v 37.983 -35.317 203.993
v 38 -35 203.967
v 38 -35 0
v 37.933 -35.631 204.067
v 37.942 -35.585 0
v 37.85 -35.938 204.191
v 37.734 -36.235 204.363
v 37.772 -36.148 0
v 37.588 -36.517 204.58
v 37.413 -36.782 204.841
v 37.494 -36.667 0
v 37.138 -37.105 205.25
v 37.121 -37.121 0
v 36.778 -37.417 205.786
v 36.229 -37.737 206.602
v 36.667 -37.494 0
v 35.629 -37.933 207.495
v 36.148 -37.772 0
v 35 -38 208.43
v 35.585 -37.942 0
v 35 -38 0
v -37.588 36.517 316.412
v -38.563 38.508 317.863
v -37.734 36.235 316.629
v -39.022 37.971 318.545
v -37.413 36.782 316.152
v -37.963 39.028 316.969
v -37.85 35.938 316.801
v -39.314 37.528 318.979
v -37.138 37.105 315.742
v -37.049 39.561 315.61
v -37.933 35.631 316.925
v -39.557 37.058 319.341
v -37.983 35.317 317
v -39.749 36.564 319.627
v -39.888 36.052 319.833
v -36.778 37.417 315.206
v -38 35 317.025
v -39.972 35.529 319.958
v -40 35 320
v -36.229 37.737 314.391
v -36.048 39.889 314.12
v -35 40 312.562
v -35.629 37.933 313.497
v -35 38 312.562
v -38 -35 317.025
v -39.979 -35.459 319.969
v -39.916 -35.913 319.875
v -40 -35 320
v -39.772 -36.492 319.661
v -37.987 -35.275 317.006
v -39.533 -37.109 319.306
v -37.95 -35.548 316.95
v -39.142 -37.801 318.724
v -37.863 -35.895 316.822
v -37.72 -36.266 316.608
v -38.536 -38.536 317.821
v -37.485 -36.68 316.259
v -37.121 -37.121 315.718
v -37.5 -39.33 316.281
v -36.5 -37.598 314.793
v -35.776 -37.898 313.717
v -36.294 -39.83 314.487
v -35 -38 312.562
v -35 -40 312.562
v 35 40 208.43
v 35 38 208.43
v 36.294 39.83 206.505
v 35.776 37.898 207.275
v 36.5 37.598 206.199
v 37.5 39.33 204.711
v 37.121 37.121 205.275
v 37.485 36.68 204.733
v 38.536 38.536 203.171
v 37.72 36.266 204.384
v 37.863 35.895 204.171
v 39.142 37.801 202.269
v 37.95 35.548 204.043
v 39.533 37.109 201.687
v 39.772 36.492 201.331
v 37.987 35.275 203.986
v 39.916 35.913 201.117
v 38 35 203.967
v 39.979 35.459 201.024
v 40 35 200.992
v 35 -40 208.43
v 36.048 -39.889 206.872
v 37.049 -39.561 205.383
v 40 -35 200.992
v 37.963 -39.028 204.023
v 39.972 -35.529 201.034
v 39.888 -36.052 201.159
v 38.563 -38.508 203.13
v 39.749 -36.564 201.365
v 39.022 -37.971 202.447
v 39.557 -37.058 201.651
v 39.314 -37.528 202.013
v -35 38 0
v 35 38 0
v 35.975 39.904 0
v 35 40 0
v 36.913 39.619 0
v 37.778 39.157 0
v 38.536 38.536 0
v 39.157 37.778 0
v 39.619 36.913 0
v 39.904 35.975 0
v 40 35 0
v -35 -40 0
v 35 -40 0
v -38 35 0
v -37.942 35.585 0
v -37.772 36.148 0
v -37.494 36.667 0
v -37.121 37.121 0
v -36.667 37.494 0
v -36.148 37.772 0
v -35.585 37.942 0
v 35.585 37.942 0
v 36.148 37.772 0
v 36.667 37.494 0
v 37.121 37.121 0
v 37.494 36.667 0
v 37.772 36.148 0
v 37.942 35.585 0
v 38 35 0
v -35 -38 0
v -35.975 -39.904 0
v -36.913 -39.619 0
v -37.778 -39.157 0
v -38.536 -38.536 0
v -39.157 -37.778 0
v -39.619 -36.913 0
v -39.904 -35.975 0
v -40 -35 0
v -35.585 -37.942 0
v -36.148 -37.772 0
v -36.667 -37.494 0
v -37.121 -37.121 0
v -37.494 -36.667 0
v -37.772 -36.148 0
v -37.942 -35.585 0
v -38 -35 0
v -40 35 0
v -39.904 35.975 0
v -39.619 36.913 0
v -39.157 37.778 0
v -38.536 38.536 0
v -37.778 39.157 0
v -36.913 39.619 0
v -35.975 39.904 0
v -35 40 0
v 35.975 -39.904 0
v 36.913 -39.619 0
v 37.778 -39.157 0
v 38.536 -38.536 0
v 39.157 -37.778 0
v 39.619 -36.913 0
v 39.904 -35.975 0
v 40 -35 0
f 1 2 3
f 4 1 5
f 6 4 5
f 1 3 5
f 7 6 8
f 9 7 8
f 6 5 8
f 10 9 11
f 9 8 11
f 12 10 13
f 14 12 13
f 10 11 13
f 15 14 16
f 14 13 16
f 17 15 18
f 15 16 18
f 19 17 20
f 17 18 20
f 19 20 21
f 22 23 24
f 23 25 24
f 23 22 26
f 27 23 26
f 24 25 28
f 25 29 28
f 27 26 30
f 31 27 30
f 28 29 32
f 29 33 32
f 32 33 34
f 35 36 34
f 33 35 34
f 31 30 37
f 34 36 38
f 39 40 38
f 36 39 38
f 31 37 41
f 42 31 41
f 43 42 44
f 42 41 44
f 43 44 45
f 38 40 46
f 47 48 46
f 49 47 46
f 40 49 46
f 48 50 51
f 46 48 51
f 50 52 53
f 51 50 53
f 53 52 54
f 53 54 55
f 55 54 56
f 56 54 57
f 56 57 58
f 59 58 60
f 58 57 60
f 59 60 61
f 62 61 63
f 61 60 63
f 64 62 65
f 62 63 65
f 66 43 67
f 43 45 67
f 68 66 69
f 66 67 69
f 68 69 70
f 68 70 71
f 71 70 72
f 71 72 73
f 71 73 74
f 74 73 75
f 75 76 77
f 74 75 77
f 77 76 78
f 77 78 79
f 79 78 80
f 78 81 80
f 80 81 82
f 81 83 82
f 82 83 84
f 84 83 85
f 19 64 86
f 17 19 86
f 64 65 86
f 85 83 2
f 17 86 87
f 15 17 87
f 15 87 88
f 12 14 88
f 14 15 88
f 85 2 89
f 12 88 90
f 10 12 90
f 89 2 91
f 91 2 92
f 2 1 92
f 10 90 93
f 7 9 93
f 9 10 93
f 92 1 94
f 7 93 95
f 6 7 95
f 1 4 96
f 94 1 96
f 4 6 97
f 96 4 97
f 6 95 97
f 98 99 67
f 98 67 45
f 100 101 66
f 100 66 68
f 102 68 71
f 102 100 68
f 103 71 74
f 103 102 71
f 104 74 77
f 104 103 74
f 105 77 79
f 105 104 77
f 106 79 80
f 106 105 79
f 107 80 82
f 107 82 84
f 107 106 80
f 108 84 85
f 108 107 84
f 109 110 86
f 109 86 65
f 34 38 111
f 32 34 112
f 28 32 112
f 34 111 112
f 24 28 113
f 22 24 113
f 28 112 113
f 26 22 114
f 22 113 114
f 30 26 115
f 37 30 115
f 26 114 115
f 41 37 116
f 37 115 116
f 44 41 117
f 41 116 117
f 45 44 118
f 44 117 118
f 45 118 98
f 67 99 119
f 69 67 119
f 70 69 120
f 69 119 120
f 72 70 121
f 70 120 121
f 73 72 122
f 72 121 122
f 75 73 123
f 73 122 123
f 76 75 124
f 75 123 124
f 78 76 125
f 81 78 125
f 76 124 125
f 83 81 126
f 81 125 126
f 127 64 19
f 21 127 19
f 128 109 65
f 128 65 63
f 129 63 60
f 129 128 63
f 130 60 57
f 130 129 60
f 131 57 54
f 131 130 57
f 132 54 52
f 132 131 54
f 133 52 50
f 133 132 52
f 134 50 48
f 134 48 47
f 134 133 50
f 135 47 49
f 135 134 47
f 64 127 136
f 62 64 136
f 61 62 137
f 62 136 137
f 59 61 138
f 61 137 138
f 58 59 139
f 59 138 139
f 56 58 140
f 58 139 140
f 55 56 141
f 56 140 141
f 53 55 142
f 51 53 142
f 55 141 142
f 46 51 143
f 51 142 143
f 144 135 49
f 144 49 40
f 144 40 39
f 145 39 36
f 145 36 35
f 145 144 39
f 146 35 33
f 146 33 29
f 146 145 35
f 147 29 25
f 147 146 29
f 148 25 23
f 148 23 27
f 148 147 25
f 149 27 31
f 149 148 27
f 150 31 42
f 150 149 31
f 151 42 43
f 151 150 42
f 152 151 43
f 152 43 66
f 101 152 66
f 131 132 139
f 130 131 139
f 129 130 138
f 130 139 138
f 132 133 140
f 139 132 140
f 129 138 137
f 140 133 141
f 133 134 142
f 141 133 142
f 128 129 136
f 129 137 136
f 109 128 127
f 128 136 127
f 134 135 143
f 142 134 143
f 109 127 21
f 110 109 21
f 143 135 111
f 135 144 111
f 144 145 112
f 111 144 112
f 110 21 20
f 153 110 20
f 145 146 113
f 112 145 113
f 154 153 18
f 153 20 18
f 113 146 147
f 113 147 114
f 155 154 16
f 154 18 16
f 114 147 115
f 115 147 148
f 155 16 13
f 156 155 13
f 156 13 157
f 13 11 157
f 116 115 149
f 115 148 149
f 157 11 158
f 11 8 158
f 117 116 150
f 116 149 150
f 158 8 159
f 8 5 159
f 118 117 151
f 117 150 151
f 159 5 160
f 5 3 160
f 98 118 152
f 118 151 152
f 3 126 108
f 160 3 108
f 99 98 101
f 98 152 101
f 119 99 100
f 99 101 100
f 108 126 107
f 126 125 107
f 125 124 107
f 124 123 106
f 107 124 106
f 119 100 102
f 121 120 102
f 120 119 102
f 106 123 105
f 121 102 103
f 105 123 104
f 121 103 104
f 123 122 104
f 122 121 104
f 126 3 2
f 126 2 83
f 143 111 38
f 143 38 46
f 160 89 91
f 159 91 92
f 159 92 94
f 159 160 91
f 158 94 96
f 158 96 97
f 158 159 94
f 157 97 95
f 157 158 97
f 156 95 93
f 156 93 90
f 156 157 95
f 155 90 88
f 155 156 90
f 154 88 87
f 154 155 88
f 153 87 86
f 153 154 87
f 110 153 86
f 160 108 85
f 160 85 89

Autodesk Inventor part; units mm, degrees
ref_plane "YZ Plane" through (0, 0, 0) normal (1, 0, 0) x (0, 1, 0)
ref_plane "XZ Plane" through (0, 0, 0) normal (0, 1, 0) x (-1, 0, 0)
ref_plane "XY Plane" through (0, 0, 0) normal (0, 0, 1) x (1, 0, 0)
sketch "Sketch1" plane through (0, 0, 0) normal (0, 0, 1) x (1, 0, 0)
  line L0 (-35, 40) -> (35, 40)
  line L1 (40, 35) -> (40, -35)
  line L2 (35, -40) -> (-35, -40)
  line L3 (-40, -35) -> (-40, 35)
  line L4 (-40, 40) -> (40, -40) construction
  line L5 (40, 40) -> (-40, -40) construction
  arc A0 (-35, 40) -> (-40, 35) centre (-35, 35) ccw
  arc A1 (40, 35) -> (35, 40) centre (35, 35) ccw
  arc A2 (35, -40) -> (40, -35) centre (35, -35) ccw
  arc A3 (-40, -35) -> (-35, -40) centre (-35, -35) ccw
  line L6 (35, 38) -> (-35, 38)
  arc A4 (-35, 38) -> (-38, 35) centre (-35, 35) ccw
  line L7 (-38, 35) -> (-38, -35)
  arc A5 (-38, -35) -> (-35, -38) centre (-35, -35) ccw
  line L8 (-35, -38) -> (35, -38)
  arc A6 (35, -38) -> (38, -35) centre (35, -35) ccw
  line L9 (38, -35) -> (38, 35)
  arc A7 (38, 35) -> (35, 38) centre (35, 35) ccw
  point P0 (0, 0)
  dimension "d0" = 80
  dimension "d1" = 5
  dimension "d2" = 2
extrude "Extrusion1" add sketch "Sketch1" along normal blind 320
sketch "Sketch2" plane through (0, 0, 0) normal (0, 1, 0) x (-1, 0, 0)
  line L0 (40, 0) -> (40, 320) projected
  line L1 (-40, 0) -> (-40, 320) projected
  line L2 (40, 320) -> (-40, 320)
  line L3 (40, 320) -> (-40, 200.9923)
  point P0 (0, 0)
  dimension "d5" = 123.91
extrude "Extrusion2" cut sketch "Sketch2" along normal through all both and the other way through all
properties part number "MSC 903 base tube"
